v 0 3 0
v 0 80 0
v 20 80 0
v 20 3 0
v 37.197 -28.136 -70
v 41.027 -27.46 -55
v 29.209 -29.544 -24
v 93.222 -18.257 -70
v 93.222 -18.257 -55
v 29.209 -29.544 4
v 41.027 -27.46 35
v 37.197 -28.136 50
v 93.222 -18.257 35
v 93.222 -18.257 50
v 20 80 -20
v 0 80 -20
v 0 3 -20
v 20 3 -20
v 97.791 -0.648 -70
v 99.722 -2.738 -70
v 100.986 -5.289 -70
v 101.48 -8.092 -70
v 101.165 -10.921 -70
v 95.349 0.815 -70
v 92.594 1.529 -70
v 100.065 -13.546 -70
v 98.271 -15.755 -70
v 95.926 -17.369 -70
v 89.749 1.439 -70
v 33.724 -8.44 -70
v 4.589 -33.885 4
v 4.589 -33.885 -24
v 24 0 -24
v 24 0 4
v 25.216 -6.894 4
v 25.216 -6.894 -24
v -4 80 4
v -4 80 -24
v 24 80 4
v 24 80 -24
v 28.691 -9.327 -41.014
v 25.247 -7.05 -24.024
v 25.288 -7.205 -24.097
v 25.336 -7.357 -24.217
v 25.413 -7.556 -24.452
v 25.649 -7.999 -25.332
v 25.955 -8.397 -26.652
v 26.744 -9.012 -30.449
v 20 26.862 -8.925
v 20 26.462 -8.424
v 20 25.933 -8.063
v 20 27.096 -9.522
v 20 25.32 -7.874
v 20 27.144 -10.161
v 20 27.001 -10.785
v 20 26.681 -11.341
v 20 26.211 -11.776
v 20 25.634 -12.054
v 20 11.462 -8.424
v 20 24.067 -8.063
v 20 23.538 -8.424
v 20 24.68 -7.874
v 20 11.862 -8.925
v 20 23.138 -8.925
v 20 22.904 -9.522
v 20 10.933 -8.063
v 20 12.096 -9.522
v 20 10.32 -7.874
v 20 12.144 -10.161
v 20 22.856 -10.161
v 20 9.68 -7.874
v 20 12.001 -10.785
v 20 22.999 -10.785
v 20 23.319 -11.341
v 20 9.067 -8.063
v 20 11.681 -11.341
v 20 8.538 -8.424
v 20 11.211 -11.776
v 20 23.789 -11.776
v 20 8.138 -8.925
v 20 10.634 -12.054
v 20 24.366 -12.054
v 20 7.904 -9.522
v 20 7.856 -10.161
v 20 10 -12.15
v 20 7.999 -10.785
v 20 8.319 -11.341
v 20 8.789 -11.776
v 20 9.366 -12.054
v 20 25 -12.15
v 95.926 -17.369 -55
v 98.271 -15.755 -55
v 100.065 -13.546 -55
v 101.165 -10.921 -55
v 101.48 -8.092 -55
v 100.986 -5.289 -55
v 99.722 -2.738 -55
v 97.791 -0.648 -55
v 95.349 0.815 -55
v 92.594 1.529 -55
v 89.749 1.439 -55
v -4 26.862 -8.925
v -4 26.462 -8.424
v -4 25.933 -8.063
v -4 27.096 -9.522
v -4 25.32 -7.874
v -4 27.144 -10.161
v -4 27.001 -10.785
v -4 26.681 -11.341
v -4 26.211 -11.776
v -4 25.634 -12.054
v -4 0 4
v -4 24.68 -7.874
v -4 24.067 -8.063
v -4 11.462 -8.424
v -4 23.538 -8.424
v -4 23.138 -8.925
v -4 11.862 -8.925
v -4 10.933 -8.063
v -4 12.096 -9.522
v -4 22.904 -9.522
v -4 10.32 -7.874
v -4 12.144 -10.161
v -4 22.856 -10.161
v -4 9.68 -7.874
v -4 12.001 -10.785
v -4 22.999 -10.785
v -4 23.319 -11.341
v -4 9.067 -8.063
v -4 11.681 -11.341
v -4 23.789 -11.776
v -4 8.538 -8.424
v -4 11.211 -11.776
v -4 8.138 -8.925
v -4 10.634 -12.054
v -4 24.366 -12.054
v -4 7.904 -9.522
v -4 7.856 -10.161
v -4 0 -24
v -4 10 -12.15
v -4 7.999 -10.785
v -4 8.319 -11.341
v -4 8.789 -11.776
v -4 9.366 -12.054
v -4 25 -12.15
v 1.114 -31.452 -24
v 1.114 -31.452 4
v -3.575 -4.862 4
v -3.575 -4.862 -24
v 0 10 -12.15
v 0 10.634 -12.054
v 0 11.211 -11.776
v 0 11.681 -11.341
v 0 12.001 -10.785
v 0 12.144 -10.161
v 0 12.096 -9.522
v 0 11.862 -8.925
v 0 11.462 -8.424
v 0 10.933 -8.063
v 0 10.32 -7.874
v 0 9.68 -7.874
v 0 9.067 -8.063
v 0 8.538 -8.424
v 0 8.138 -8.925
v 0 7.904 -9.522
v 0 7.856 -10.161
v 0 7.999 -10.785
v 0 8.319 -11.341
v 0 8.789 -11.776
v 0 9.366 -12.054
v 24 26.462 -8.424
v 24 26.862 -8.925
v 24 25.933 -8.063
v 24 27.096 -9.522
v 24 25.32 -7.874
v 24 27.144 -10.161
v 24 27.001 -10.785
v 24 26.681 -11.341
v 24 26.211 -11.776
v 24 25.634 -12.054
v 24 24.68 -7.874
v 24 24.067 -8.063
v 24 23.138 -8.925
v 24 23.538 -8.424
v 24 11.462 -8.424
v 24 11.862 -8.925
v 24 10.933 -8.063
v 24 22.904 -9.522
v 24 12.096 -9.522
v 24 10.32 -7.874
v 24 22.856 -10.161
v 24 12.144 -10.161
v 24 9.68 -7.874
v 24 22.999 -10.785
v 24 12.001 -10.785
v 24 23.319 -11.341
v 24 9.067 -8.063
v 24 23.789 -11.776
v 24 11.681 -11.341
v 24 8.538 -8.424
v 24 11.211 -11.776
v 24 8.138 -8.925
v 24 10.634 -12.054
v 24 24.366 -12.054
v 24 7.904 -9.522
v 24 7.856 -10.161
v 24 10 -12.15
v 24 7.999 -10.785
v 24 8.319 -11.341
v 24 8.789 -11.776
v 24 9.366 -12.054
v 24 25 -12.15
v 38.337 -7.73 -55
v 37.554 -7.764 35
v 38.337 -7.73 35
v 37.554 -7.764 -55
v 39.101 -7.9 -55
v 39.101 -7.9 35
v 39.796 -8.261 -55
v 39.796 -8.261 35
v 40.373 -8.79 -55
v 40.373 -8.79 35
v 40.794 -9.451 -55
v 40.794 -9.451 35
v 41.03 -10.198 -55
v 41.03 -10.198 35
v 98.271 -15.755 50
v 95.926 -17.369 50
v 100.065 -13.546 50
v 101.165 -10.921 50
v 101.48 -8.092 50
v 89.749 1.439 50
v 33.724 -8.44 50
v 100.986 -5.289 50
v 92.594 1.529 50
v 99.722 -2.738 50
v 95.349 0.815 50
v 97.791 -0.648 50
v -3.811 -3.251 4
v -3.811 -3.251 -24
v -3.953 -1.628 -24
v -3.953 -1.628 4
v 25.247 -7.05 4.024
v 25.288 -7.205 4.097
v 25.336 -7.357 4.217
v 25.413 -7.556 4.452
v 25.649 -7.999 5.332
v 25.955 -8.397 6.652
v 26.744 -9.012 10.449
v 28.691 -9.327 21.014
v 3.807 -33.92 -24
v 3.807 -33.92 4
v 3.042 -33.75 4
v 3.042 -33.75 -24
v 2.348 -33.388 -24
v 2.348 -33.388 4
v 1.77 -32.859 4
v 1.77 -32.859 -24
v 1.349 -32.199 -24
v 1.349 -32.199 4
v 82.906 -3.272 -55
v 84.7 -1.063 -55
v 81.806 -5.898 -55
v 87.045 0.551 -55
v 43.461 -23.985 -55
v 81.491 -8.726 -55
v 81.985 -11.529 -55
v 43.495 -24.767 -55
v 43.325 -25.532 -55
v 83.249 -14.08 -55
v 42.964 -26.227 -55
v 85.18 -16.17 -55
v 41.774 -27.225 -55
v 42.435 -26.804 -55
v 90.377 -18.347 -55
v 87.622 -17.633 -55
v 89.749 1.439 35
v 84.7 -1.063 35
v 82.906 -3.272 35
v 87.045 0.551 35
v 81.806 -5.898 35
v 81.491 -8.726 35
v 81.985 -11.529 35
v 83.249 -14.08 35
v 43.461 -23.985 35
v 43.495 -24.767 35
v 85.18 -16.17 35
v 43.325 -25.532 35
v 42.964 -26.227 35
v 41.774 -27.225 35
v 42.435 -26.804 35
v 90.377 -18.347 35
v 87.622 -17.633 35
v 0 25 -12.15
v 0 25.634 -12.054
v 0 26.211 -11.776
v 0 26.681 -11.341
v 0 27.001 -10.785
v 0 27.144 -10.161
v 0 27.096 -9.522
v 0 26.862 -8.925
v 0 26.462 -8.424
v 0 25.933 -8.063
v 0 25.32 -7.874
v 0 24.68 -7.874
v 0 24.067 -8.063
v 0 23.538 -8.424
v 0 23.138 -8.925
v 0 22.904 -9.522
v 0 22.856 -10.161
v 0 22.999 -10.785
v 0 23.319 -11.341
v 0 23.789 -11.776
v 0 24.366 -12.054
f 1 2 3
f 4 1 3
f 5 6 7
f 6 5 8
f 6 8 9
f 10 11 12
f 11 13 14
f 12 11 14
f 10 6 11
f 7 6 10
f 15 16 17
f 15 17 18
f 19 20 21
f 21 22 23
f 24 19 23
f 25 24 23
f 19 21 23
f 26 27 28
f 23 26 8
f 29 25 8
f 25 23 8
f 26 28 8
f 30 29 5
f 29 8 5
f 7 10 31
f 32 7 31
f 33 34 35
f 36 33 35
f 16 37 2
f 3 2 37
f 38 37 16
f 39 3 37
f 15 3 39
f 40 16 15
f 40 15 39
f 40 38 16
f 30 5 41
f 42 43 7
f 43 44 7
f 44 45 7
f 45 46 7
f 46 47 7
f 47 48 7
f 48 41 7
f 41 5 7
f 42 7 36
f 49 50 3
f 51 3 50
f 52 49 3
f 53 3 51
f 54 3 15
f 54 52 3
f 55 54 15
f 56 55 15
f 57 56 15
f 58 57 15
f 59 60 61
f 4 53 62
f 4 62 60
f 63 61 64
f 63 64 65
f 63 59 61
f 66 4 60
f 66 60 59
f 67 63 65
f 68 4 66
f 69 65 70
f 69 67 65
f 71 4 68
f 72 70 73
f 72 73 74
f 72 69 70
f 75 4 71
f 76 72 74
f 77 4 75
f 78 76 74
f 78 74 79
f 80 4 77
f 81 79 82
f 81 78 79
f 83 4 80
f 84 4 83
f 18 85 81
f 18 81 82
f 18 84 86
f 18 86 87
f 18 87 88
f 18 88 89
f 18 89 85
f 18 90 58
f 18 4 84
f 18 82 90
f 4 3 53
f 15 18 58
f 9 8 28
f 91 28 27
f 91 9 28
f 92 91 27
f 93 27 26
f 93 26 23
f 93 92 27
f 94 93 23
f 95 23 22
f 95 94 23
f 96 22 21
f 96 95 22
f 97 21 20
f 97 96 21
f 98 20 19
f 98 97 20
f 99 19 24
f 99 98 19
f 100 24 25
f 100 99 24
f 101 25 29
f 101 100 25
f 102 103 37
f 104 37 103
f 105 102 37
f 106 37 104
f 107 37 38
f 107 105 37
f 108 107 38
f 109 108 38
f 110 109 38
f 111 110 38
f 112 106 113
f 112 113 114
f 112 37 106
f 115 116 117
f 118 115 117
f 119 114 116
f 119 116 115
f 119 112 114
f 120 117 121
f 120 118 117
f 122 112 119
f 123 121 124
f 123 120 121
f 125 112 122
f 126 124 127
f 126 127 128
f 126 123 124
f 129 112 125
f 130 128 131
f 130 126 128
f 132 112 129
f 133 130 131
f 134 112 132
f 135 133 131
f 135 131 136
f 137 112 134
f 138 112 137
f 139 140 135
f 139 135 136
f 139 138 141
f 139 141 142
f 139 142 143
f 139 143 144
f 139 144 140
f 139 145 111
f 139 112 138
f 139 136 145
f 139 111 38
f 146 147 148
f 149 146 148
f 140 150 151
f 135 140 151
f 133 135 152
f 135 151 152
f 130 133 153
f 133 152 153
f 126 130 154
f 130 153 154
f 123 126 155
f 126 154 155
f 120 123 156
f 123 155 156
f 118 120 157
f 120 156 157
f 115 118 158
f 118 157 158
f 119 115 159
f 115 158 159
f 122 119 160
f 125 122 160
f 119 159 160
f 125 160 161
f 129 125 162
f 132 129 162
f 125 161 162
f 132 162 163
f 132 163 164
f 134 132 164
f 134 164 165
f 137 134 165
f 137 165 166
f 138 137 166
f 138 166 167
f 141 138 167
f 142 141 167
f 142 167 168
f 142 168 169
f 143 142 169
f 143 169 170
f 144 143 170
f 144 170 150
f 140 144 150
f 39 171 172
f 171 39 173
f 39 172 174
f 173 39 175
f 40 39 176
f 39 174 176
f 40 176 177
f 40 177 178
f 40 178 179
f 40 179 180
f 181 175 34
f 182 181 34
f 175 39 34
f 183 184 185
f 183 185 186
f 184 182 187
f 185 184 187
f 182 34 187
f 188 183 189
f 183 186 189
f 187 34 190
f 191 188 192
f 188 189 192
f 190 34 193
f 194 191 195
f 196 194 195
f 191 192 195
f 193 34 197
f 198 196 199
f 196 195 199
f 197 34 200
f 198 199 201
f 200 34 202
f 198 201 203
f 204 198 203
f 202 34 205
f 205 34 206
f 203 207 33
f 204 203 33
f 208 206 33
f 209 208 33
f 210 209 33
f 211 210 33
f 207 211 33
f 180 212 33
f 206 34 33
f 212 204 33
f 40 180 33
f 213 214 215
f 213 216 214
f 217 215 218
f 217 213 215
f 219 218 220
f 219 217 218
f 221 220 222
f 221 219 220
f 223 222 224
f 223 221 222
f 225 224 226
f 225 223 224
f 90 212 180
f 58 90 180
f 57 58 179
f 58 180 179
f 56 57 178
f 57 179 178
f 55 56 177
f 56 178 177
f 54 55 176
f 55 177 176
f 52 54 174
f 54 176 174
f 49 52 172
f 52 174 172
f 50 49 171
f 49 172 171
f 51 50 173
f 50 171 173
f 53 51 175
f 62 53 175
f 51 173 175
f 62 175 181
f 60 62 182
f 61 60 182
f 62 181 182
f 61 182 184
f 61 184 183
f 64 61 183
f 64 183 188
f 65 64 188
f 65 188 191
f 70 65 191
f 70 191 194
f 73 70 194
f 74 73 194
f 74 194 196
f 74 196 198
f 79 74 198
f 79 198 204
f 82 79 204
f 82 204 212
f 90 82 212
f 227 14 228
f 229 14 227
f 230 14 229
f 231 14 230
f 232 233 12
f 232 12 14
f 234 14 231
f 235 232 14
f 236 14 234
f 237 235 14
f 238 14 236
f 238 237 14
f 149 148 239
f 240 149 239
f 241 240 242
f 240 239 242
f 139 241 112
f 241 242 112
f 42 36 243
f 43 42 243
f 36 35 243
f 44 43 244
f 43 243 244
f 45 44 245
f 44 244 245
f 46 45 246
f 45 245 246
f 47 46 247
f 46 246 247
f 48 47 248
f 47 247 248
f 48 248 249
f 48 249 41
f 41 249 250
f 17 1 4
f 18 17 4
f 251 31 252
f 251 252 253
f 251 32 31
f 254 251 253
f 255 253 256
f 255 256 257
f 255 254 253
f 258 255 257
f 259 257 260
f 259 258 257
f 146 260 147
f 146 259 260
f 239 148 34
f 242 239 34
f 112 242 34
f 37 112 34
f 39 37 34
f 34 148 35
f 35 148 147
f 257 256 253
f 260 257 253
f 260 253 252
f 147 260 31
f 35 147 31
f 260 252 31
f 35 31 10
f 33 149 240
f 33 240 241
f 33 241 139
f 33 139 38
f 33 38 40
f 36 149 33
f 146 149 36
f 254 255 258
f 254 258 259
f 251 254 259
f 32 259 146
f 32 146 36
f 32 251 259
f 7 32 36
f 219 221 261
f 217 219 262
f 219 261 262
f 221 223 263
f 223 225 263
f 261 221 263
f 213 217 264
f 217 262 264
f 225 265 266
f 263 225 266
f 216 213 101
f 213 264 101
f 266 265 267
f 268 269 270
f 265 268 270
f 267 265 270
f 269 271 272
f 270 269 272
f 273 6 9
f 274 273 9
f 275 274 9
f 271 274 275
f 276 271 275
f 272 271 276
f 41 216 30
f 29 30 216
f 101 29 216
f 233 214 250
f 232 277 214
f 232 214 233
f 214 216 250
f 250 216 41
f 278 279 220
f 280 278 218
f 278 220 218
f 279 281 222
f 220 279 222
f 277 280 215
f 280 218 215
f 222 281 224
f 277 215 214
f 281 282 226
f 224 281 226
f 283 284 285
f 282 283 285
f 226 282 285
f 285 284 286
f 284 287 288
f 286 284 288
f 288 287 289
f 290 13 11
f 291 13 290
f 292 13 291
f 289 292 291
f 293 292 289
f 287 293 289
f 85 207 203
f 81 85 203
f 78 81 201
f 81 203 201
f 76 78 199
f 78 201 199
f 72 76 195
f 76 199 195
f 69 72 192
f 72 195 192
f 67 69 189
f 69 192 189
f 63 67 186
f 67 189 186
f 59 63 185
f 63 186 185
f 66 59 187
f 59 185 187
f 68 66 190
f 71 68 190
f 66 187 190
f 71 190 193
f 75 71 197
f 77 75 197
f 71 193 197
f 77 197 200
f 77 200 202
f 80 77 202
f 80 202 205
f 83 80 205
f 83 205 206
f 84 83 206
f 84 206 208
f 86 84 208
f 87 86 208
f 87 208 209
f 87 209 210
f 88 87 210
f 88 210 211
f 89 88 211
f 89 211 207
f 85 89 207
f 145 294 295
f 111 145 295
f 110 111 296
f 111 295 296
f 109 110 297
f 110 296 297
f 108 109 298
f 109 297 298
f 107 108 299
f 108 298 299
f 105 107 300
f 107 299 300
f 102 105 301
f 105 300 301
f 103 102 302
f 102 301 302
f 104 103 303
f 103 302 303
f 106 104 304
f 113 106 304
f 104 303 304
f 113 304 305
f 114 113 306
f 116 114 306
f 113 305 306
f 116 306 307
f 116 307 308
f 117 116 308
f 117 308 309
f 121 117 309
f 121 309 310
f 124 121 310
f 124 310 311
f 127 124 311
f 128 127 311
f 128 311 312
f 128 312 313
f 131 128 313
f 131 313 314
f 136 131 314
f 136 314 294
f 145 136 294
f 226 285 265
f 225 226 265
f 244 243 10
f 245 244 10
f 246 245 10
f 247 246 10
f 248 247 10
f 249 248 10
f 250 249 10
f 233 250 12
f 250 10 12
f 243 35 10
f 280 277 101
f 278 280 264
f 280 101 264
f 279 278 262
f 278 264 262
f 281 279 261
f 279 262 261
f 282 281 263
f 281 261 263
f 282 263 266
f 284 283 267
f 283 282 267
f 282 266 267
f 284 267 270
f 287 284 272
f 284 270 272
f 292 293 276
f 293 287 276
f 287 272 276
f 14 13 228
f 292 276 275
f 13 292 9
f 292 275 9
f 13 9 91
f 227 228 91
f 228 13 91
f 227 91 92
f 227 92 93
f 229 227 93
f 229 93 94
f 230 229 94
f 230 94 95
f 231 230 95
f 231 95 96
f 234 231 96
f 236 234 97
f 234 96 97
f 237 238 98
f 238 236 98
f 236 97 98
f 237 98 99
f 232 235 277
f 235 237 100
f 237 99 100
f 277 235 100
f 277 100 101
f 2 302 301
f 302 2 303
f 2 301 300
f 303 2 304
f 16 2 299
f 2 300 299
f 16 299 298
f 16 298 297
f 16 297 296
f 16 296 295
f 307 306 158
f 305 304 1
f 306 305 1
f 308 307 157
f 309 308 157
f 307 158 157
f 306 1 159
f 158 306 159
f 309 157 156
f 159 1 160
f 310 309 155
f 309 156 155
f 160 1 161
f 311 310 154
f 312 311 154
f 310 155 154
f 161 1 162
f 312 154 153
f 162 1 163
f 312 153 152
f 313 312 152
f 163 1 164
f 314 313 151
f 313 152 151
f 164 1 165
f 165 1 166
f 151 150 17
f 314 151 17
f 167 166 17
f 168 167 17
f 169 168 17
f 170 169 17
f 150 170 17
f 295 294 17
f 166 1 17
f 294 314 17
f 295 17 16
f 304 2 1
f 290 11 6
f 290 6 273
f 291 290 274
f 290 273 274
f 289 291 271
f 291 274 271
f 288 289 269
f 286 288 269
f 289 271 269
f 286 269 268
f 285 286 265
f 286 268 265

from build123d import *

# Parameters (mm, degrees)
SKETCH1_W                       = 28
SKETCH1_H                       = 28
SKETCH1_W_2                     = 20
SKETCH1_H_2                     = 20
BOSS_EXTRUDE1_DEPTH             = 30
SKETCH2_W                       = 28
SKETCH2_H                       = 28
BOSS_EXTRUDE2_DEPTH             = 3
SKETCH3_R                       = 2.15
CUT_EXTRUDE1_DEPTH              = 48.539457296
BOSS_EXTRUDE3_DEPTH             = 28
BOSS_EXTRUDE4_DEPTH             = 20
BOSS_EXTRUDE5_REACH             = 146.565
SKETCH6_R                       = 10
BOSS_EXTRUDE5_DIRECTION_2_REACH = 146.565
SKETCH7_W                       = 28
SKETCH7_H                       = 28
SKETCH7_W_2                     = 20
SKETCH7_H_2                     = 20
BOSS_EXTRUDE6_DEPTH             = 50
FILLET1_R                       = 3


with BuildPart() as part:
    # Sketch1 → Boss-Extrude1 (new body)
    with BuildSketch(Plane(origin=(0, 0, 0), x_dir=(1, 0, 0), z_dir=(0, 1, 0))):
        with Locations((10, 10)):
            Rectangle(SKETCH1_W, SKETCH1_H)
        with Locations((10, 10)):
            Rectangle(SKETCH1_W_2, SKETCH1_H_2, mode=Mode.SUBTRACT)
    extrude(amount=BOSS_EXTRUDE1_DEPTH)

    # Sketch2 → Boss-Extrude2 (add)
    with BuildSketch(Plane.XZ):
        with Locations((10, -10)):
            Rectangle(SKETCH2_W, SKETCH2_H)
    extrude(amount=-BOSS_EXTRUDE2_DEPTH)

    # Sketch3 → Cut-Extrude1 (cut, through all)
    with BuildSketch(Plane(origin=(24, 0, 0), x_dir=(0, 0, -1), z_dir=(1, 0, 0))):
        with Locations((10, 25)):
            Circle(SKETCH3_R)
        with Locations((10, 10)):
            Circle(SKETCH3_R)
    extrude(amount=-CUT_EXTRUDE1_DEPTH, mode=Mode.SUBTRACT)

    # Sketch4 → Boss-Extrude3 (add)
    with BuildSketch(Plane.XY.offset(4)):
        with BuildLine():
            Line((24, 0), (29.20944533, -29.54423259))
            Line((29.20944533, -29.54423259), (1.634828246, -34.406381565))
            Line((1.634828246, -34.406381565), (-3.574617084, -4.862148975))
            ThreePointArc((-3.574617084, -4.862148975), (-3.893451547, -2.440360797), (-4, 0))
            Line((-4, 0), (24, 0))
        make_face()
    extrude(amount=-BOSS_EXTRUDE3_DEPTH)

    # Sketch5 → Boss-Extrude4 (add)
    with BuildSketch(Plane(origin=(5.933133881, -33.64847431, 0), x_dir=(0, 0, -1), z_dir=(0.1736481776669318, -0.9848077530122078, 0))):
        Polygon((24, 23.635386072), (-4, 23.635386072), (-50, 31.746427185), (-50, 88.635386072), (-35, 88.635386072), (-35, 38.635386072), (55, 38.635386072), (55, 88.635386072), (70, 88.635386072), (70, 31.746427185), align=None)
    extrude(amount=-BOSS_EXTRUDE4_DEPTH)

    # Boss-Extrude5: up to this face of the body (flat: up to its plane)
    boss_extrude5_end = Plane(part.part.faces().sort_by_distance((63.473123613, -13.348355532, 50))[0])
    # Sketch6 → Boss-Extrude5 (add, up to the picked face)
    with BuildSketch(Plane.XY.offset(-55), mode=Mode.PRIVATE) as boss_extrude5_sk1:
        with Locations(Location((91.485467499, -8.409023512, 0), (0, 0, 100))):
            Circle(SKETCH6_R)
    boss_extrude5_tool1 = split(extrude(boss_extrude5_sk1.sketch, amount=BOSS_EXTRUDE5_REACH, mode=Mode.PRIVATE), bisect_by=boss_extrude5_end, keep=Keep.BOTH, mode=Mode.PRIVATE)
    add(boss_extrude5_tool1.solids().sort_by(Axis((91.485467, -8.409024, -55), (0, 0, 1)))[0])

    # Boss-Extrude5 direction 2: up to this face of the body (flat: up to its plane)
    boss_extrude5_direction_2_end = Plane(part.part.faces().sort_by_distance((63.473123613, -13.348355532, -70))[0])
    # Sketch6 → Boss-Extrude5 direction 2 (add, up to the picked face)
    with BuildSketch(Plane.XY.offset(-55), mode=Mode.PRIVATE) as boss_extrude5_direction_2_sk1:
        with Locations(Location((91.485467499, -8.409023512, 0), (0, 0, 100))):
            Circle(SKETCH6_R)
    boss_extrude5_direction_2_tool1 = split(extrude(boss_extrude5_direction_2_sk1.sketch, amount=-BOSS_EXTRUDE5_DIRECTION_2_REACH, mode=Mode.PRIVATE), bisect_by=boss_extrude5_direction_2_end, keep=Keep.BOTH, mode=Mode.PRIVATE)
    add(boss_extrude5_direction_2_tool1.solids().sort_by(Axis((91.485467, -8.409024, -55), (0, 0, -1)))[0])

    # Sketch7 → Boss-Extrude6 (add)
    with BuildSketch(Plane(origin=(0, 30, 0), x_dir=(1, 0, 0), z_dir=(0, 1, 0))):
        with Locations((10, 10)):
            Rectangle(SKETCH7_W, SKETCH7_H)
        with Locations((10, 10)):
            Rectangle(SKETCH7_W_2, SKETCH7_H_2, mode=Mode.SUBTRACT)
    extrude(amount=BOSS_EXTRUDE6_DEPTH)

    # Fillet1
    fillet1_edges = [part.edges().sort_by_distance(p)[0] for p in [
        (1.634828246, -34.406381565, -10),
        (25.736481777, -9.84807753, -10),
        (40.508598072, -7.243354865, -10),
        (43.981561625, -26.939509925, -10),
    ]]
    fillet(fillet1_edges, radius=FILLET1_R)


solid = part.part
